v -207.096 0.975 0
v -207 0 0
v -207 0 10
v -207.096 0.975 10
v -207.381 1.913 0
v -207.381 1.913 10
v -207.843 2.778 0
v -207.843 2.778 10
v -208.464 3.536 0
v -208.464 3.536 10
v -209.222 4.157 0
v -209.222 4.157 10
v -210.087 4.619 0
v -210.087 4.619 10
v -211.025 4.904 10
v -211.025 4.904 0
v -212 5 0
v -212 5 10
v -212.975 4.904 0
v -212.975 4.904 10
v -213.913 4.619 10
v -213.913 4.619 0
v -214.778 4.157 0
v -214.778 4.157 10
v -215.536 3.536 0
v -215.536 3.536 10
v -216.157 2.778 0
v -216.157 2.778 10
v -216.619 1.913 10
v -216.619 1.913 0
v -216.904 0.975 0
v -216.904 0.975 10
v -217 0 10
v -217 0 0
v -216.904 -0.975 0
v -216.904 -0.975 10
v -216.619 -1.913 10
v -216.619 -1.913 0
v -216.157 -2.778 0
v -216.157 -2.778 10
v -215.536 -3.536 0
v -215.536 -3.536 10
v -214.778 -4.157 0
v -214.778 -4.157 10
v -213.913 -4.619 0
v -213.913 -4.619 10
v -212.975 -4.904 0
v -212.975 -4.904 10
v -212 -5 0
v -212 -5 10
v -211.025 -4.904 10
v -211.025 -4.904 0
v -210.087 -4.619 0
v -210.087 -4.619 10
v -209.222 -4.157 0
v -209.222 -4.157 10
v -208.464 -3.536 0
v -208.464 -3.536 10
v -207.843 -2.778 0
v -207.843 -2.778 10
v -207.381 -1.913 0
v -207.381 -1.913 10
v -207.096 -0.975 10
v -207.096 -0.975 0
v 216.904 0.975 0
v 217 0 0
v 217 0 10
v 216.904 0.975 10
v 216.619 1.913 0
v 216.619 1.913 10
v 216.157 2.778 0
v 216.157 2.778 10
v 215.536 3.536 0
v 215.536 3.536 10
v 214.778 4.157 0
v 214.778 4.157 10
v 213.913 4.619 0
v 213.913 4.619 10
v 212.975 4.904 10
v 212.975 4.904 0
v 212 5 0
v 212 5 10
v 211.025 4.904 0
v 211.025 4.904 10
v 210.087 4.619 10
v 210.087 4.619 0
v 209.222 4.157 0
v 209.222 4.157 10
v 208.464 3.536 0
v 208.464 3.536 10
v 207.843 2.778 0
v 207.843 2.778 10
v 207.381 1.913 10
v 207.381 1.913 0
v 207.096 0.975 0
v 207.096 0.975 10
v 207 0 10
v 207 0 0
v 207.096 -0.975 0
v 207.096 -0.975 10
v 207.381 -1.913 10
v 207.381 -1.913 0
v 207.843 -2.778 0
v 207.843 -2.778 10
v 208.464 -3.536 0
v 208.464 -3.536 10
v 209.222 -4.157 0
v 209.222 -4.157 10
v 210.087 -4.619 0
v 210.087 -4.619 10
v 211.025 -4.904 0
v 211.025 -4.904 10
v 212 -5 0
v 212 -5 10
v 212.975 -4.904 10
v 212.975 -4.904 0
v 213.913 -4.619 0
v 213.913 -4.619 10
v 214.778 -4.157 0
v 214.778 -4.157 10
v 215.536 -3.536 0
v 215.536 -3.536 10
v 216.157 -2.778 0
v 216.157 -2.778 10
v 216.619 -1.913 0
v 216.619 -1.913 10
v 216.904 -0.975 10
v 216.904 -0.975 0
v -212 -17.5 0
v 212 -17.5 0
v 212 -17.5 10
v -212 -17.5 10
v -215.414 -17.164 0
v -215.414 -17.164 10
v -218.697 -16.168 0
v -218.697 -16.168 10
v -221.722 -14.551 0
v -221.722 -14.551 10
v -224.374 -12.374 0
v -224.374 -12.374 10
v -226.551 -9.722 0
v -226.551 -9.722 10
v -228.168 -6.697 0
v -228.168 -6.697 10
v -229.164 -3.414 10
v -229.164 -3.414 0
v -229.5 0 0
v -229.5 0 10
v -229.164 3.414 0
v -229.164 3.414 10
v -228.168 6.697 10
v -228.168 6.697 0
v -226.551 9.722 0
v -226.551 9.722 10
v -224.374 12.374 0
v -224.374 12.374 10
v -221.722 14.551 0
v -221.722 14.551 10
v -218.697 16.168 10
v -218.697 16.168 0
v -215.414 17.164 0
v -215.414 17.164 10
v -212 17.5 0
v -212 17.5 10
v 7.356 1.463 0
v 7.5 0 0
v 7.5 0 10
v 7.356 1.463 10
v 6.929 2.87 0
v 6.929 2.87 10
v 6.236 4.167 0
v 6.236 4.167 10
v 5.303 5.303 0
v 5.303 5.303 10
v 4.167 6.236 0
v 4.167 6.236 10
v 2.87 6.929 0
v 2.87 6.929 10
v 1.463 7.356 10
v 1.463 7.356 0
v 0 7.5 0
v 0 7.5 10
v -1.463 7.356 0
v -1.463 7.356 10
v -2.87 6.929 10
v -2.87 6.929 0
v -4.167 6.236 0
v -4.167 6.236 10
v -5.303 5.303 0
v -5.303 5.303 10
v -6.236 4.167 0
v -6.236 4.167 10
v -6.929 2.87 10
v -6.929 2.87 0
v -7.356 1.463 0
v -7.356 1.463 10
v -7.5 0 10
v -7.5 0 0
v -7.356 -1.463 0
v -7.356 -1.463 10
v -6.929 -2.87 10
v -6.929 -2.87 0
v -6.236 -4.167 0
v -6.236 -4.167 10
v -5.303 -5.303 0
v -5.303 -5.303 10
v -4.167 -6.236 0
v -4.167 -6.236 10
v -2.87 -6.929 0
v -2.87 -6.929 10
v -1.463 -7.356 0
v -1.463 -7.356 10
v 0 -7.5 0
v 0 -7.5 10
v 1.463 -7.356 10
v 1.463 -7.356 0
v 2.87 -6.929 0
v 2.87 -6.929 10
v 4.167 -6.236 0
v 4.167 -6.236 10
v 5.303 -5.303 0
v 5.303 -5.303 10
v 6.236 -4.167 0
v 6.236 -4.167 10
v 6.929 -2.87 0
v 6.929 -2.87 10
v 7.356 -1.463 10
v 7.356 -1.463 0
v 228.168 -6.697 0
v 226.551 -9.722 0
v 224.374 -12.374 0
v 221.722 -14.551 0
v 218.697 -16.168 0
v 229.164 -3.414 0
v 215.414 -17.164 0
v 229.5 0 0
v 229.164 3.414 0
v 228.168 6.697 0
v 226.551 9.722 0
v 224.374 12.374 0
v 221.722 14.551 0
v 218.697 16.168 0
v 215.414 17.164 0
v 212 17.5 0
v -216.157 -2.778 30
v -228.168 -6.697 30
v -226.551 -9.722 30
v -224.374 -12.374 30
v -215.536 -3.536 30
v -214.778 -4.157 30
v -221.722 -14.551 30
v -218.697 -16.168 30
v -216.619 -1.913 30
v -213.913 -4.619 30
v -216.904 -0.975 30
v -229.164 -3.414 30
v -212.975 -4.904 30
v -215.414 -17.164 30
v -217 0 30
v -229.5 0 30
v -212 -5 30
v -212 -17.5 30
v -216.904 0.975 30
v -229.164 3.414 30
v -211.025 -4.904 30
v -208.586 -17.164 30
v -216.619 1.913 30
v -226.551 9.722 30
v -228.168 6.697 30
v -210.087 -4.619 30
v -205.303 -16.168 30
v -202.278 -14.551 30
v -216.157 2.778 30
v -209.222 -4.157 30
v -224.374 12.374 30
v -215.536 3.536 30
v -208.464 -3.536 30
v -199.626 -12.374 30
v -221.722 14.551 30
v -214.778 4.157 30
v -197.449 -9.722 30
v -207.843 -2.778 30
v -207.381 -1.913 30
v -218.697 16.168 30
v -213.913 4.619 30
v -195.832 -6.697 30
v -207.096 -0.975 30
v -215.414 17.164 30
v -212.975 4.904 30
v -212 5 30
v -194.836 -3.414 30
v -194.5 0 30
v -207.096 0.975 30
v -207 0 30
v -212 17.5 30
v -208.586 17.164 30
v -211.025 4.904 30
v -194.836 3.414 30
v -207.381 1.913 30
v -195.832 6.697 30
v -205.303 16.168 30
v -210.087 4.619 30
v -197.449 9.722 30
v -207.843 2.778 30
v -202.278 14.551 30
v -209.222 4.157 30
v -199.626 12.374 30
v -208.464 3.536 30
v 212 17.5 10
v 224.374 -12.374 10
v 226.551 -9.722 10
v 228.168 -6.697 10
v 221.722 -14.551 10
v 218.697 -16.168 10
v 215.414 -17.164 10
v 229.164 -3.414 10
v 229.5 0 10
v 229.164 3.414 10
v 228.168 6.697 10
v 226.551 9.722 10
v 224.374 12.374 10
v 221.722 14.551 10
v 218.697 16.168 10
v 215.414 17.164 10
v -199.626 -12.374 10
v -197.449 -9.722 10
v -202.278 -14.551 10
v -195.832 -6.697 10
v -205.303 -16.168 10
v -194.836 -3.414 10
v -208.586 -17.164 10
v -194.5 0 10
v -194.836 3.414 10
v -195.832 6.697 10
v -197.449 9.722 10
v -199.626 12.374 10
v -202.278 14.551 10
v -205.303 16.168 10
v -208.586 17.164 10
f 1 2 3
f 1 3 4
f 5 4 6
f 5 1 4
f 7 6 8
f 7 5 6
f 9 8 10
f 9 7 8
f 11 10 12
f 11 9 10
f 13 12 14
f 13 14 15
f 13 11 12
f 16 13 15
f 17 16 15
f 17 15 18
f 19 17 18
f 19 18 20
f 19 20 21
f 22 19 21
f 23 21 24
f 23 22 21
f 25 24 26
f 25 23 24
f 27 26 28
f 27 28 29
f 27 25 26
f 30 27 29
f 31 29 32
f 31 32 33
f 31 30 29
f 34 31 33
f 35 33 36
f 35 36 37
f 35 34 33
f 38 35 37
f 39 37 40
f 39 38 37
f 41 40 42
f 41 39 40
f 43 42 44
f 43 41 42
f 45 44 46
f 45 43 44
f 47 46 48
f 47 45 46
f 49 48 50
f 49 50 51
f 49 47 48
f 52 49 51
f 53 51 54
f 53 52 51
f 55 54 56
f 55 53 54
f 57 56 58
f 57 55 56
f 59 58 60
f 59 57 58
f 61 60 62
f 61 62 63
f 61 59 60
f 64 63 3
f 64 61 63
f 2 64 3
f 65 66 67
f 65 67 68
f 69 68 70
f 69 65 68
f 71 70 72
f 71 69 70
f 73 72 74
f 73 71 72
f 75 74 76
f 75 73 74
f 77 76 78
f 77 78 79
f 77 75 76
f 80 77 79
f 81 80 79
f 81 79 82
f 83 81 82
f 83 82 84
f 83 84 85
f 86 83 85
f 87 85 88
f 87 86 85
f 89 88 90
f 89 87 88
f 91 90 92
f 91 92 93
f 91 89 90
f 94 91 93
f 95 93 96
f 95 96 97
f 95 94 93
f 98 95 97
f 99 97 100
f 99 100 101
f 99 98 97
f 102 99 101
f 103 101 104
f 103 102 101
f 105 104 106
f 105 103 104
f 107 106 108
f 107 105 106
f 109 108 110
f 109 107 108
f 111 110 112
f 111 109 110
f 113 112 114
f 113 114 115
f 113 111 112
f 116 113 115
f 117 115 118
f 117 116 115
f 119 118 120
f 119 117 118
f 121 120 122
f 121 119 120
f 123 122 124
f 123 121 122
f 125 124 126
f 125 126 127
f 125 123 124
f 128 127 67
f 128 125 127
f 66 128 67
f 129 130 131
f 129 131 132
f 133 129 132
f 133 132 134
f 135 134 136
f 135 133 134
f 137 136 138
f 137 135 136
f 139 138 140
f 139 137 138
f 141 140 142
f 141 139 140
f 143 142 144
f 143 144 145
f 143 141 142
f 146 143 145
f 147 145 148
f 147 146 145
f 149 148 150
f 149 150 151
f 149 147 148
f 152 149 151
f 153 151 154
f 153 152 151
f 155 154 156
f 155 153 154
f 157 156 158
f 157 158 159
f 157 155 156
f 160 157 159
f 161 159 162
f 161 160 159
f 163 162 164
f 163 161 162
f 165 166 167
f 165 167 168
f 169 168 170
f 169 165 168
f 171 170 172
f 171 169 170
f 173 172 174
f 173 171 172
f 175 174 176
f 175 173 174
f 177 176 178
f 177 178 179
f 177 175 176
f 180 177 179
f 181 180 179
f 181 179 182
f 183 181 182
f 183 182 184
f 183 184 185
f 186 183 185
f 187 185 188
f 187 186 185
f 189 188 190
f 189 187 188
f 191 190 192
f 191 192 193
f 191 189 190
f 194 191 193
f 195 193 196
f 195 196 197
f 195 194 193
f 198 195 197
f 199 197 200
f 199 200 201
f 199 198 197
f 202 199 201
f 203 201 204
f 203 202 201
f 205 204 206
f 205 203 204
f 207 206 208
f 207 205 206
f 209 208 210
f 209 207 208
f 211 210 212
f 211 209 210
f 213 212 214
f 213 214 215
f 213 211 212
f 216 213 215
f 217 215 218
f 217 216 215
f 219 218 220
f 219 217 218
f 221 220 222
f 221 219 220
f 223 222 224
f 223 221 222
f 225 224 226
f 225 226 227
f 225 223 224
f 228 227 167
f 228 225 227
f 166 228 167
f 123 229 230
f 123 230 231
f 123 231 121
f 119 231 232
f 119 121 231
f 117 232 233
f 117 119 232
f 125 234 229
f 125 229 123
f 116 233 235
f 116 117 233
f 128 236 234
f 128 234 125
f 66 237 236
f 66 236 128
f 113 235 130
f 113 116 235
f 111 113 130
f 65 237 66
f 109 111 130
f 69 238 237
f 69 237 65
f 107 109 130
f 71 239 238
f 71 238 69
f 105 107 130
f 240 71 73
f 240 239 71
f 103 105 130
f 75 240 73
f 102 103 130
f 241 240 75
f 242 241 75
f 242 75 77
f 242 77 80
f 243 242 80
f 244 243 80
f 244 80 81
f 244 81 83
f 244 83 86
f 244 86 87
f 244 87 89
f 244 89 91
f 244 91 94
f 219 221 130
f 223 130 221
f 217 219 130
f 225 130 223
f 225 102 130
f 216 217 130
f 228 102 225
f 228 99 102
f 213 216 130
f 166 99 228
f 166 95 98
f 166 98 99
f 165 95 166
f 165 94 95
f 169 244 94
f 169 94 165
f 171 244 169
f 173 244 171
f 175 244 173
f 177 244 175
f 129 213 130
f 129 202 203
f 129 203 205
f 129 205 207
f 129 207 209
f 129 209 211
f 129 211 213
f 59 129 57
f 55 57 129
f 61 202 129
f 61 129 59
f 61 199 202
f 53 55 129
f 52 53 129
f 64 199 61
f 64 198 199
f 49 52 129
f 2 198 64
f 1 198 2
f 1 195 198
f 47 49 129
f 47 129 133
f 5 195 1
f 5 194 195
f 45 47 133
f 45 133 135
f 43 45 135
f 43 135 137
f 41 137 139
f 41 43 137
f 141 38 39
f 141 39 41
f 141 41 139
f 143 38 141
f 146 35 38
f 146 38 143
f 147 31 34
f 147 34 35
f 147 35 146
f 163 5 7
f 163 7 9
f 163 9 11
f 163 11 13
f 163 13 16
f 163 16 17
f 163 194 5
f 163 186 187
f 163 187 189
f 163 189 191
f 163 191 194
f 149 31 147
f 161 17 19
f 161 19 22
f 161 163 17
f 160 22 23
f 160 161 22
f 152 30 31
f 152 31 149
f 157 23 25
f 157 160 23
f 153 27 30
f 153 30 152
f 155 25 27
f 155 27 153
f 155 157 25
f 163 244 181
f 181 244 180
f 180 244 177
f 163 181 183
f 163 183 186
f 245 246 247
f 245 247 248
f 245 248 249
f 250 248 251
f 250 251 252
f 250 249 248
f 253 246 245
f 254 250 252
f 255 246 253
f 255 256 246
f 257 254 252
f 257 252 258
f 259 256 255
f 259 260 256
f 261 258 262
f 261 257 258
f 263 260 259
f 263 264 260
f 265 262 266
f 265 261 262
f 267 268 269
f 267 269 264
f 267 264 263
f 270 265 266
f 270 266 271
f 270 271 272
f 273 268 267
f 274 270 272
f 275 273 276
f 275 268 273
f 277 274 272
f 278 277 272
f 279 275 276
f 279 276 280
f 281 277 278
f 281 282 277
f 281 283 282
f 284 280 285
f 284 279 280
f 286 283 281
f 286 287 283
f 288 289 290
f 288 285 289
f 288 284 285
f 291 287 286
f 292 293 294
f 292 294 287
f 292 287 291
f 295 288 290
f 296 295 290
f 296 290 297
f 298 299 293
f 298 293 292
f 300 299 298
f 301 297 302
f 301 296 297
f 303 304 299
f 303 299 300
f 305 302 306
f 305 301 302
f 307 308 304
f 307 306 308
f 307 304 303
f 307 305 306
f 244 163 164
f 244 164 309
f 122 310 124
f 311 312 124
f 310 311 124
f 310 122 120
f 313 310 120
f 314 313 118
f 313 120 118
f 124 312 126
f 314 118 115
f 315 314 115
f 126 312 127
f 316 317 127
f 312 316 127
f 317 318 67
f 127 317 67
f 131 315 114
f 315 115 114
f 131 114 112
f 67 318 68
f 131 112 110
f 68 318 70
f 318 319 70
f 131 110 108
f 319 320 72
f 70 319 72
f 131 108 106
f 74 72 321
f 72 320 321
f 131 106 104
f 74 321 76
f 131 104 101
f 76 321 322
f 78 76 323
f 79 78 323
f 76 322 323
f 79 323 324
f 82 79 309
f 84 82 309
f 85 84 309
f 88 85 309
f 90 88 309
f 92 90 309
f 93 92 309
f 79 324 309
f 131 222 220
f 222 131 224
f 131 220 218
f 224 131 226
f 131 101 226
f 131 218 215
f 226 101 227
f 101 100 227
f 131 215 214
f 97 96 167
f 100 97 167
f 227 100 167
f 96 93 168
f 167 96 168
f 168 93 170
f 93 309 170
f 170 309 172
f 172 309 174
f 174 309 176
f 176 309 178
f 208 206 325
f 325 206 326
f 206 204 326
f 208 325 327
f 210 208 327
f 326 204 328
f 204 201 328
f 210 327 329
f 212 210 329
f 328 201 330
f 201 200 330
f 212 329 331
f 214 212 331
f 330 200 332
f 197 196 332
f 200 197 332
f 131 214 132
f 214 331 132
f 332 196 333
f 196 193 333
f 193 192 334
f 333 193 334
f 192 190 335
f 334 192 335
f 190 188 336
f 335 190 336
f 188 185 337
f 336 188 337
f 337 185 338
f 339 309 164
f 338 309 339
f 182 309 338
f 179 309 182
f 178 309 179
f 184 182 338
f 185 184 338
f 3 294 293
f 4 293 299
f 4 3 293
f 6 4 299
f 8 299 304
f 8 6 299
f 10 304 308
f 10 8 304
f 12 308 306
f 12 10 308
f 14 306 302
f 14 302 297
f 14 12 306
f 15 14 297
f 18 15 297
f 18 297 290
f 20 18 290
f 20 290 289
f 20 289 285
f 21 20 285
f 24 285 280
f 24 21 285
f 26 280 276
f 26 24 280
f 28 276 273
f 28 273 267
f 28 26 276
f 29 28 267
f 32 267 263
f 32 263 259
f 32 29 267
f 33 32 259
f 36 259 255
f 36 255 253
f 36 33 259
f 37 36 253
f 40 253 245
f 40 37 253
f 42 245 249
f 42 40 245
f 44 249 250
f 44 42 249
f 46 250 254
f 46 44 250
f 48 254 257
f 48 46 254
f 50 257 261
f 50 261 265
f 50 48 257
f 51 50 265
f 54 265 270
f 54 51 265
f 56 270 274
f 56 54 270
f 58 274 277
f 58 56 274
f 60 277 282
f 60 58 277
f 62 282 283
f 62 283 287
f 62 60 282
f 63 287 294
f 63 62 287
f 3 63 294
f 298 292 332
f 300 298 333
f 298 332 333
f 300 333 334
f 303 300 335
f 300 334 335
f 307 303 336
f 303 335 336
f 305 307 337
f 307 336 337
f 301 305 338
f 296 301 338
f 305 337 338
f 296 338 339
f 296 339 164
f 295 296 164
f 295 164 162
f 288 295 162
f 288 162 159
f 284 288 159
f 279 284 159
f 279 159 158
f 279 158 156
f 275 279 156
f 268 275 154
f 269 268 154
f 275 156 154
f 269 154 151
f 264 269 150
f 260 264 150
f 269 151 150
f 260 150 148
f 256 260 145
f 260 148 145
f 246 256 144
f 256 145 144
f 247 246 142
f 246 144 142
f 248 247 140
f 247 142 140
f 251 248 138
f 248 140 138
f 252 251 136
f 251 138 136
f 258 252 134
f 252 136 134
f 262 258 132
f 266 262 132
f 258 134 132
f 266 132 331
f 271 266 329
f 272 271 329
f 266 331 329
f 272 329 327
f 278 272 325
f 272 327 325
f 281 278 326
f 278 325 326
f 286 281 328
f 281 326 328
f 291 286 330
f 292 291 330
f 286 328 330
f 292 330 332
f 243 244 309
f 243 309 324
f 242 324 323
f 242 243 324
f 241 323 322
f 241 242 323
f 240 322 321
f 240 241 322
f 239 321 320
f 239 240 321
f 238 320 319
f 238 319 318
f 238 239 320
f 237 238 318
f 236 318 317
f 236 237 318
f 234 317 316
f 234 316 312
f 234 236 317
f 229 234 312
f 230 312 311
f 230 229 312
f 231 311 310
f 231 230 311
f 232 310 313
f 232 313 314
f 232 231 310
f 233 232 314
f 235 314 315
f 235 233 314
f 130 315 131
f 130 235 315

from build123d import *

# Parameters (mm, degrees)
CROQUIS1_R              = 5
CROQUIS1_R_2            = 7.5
SALIENTE_EXTRUIR1_DEPTH = 10
CROQUIS2_R              = 17.5
CROQUIS2_R_2            = 5
SALIENTE_EXTRUIR2_DEPTH = 20


with BuildPart() as part:
    # Croquis1 → Saliente-Extruir1 (new body)
    with BuildSketch(Plane.XY):
        with BuildLine():
            Line((-212, 17.5), (212, 17.5))
            ThreePointArc((212, 17.5), (229.5, 0), (212, -17.5))
            Line((212, -17.5), (-212, -17.5))
            ThreePointArc((-212, -17.5), (-229.5, 0), (-212, 17.5))
        make_face()
        with Locations((-212, 0)):
            Circle(CROQUIS1_R, mode=Mode.SUBTRACT)
        with Locations((212, 0)):
            Circle(CROQUIS1_R, mode=Mode.SUBTRACT)
        Circle(CROQUIS1_R_2, mode=Mode.SUBTRACT)
    extrude(amount=SALIENTE_EXTRUIR1_DEPTH)

    # Croquis2 → Saliente-Extruir2 (add)
    with BuildSketch(Plane.XY.offset(10)):
        with Locations((-212, 0)):
            Circle(CROQUIS2_R)
        with Locations((-212, 0)):
            Circle(CROQUIS2_R_2, mode=Mode.SUBTRACT)
    extrude(amount=SALIENTE_EXTRUIR2_DEPTH)


solid = part.part
